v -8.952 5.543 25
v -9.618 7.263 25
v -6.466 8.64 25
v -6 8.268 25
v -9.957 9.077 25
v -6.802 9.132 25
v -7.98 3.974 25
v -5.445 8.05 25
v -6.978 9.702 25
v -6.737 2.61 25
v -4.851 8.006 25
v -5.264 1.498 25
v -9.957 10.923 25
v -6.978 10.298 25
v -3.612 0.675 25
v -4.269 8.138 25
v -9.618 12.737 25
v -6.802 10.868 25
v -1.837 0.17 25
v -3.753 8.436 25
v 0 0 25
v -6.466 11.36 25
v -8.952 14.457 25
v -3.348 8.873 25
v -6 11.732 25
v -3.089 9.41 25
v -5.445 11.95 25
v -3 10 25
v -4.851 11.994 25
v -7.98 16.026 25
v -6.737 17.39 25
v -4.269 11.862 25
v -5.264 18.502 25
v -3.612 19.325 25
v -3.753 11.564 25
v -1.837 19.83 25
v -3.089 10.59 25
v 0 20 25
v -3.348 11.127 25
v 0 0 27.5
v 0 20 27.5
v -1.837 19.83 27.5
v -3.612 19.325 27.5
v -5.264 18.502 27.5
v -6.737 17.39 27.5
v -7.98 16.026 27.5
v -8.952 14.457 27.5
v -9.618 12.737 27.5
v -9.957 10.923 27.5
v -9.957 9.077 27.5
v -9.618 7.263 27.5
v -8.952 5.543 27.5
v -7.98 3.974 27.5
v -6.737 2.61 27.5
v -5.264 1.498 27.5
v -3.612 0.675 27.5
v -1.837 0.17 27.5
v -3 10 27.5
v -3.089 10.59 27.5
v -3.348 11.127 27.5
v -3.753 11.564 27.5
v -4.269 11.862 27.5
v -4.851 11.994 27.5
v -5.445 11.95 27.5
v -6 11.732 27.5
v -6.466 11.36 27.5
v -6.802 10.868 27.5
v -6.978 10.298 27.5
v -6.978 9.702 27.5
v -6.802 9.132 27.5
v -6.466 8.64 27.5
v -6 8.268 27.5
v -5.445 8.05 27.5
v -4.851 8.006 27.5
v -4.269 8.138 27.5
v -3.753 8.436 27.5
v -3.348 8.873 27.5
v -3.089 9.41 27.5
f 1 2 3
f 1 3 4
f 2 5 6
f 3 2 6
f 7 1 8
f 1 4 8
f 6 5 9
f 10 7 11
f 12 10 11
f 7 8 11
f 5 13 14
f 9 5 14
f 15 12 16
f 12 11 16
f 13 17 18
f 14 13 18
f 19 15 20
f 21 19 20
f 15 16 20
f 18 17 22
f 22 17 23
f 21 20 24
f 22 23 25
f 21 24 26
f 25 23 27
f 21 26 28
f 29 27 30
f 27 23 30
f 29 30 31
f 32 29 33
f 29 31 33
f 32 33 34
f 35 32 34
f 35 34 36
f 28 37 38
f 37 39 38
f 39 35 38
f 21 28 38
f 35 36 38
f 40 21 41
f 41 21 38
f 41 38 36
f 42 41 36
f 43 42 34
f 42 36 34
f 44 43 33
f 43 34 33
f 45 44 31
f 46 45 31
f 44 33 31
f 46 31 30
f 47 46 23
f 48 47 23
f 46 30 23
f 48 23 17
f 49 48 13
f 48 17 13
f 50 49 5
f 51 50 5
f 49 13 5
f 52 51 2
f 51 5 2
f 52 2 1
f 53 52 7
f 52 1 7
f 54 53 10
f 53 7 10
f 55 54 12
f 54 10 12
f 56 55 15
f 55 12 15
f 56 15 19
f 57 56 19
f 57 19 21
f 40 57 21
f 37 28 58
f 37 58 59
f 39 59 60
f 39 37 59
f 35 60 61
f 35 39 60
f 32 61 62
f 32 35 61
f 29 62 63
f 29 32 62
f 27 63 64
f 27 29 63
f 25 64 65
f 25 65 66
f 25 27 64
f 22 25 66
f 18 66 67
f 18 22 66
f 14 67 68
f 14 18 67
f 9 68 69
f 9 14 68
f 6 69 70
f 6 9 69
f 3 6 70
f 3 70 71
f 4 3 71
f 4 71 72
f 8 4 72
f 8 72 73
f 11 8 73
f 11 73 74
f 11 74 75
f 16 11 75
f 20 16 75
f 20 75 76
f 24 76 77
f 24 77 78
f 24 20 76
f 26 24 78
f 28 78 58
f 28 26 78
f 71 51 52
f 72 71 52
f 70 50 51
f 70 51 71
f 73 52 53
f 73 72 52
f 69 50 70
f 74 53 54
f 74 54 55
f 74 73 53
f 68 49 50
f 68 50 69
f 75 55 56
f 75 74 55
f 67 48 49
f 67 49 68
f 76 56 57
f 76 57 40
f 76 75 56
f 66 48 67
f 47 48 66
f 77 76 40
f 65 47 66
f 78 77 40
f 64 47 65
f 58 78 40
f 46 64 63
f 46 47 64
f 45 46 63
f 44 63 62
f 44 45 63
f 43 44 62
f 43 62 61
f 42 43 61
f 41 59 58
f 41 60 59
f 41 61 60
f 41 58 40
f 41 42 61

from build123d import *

# Parameters (mm, degrees)
BOX010_W          = 10
BOX010_H          = 20
BOX010_DEPTH      = 2.5
CYLINDER004_R     = 2
CYLINDER004_DEPTH = 2.5
CYLINDER005_R     = 10
CYLINDER005_DEPTH = 2.5


with BuildPart() as cubo002:
    # Box010 → Box010 (new body)
    with BuildSketch(Plane.XY.offset(25)):
        with Locations((5, 10)):
            Rectangle(BOX010_W, BOX010_H)
    extrude(amount=BOX010_DEPTH)


with BuildPart() as cilindro004:
    # Cylinder004 → Cylinder004 (new body)
    with BuildSketch(Plane(origin=(-5, 10, 25), x_dir=(1, 0, 0), z_dir=(0, 0, 1))):
        Circle(CYLINDER004_R)
    extrude(amount=CYLINDER004_DEPTH)


with BuildPart() as cut010:
    # Cylinder005 → Cylinder005 (new body)
    with BuildSketch(Plane(origin=(0, 10, 25), x_dir=(1, 0, 0), z_dir=(0, 0, 1))):
        Circle(CYLINDER005_R)
    extrude(amount=CYLINDER005_DEPTH)

    # Cut009: cut Cilindro004
    add(cilindro004.part, mode=Mode.SUBTRACT)

    # Cut010: cut Cubo002
    add(cubo002.part, mode=Mode.SUBTRACT)


solid = cut010.part
